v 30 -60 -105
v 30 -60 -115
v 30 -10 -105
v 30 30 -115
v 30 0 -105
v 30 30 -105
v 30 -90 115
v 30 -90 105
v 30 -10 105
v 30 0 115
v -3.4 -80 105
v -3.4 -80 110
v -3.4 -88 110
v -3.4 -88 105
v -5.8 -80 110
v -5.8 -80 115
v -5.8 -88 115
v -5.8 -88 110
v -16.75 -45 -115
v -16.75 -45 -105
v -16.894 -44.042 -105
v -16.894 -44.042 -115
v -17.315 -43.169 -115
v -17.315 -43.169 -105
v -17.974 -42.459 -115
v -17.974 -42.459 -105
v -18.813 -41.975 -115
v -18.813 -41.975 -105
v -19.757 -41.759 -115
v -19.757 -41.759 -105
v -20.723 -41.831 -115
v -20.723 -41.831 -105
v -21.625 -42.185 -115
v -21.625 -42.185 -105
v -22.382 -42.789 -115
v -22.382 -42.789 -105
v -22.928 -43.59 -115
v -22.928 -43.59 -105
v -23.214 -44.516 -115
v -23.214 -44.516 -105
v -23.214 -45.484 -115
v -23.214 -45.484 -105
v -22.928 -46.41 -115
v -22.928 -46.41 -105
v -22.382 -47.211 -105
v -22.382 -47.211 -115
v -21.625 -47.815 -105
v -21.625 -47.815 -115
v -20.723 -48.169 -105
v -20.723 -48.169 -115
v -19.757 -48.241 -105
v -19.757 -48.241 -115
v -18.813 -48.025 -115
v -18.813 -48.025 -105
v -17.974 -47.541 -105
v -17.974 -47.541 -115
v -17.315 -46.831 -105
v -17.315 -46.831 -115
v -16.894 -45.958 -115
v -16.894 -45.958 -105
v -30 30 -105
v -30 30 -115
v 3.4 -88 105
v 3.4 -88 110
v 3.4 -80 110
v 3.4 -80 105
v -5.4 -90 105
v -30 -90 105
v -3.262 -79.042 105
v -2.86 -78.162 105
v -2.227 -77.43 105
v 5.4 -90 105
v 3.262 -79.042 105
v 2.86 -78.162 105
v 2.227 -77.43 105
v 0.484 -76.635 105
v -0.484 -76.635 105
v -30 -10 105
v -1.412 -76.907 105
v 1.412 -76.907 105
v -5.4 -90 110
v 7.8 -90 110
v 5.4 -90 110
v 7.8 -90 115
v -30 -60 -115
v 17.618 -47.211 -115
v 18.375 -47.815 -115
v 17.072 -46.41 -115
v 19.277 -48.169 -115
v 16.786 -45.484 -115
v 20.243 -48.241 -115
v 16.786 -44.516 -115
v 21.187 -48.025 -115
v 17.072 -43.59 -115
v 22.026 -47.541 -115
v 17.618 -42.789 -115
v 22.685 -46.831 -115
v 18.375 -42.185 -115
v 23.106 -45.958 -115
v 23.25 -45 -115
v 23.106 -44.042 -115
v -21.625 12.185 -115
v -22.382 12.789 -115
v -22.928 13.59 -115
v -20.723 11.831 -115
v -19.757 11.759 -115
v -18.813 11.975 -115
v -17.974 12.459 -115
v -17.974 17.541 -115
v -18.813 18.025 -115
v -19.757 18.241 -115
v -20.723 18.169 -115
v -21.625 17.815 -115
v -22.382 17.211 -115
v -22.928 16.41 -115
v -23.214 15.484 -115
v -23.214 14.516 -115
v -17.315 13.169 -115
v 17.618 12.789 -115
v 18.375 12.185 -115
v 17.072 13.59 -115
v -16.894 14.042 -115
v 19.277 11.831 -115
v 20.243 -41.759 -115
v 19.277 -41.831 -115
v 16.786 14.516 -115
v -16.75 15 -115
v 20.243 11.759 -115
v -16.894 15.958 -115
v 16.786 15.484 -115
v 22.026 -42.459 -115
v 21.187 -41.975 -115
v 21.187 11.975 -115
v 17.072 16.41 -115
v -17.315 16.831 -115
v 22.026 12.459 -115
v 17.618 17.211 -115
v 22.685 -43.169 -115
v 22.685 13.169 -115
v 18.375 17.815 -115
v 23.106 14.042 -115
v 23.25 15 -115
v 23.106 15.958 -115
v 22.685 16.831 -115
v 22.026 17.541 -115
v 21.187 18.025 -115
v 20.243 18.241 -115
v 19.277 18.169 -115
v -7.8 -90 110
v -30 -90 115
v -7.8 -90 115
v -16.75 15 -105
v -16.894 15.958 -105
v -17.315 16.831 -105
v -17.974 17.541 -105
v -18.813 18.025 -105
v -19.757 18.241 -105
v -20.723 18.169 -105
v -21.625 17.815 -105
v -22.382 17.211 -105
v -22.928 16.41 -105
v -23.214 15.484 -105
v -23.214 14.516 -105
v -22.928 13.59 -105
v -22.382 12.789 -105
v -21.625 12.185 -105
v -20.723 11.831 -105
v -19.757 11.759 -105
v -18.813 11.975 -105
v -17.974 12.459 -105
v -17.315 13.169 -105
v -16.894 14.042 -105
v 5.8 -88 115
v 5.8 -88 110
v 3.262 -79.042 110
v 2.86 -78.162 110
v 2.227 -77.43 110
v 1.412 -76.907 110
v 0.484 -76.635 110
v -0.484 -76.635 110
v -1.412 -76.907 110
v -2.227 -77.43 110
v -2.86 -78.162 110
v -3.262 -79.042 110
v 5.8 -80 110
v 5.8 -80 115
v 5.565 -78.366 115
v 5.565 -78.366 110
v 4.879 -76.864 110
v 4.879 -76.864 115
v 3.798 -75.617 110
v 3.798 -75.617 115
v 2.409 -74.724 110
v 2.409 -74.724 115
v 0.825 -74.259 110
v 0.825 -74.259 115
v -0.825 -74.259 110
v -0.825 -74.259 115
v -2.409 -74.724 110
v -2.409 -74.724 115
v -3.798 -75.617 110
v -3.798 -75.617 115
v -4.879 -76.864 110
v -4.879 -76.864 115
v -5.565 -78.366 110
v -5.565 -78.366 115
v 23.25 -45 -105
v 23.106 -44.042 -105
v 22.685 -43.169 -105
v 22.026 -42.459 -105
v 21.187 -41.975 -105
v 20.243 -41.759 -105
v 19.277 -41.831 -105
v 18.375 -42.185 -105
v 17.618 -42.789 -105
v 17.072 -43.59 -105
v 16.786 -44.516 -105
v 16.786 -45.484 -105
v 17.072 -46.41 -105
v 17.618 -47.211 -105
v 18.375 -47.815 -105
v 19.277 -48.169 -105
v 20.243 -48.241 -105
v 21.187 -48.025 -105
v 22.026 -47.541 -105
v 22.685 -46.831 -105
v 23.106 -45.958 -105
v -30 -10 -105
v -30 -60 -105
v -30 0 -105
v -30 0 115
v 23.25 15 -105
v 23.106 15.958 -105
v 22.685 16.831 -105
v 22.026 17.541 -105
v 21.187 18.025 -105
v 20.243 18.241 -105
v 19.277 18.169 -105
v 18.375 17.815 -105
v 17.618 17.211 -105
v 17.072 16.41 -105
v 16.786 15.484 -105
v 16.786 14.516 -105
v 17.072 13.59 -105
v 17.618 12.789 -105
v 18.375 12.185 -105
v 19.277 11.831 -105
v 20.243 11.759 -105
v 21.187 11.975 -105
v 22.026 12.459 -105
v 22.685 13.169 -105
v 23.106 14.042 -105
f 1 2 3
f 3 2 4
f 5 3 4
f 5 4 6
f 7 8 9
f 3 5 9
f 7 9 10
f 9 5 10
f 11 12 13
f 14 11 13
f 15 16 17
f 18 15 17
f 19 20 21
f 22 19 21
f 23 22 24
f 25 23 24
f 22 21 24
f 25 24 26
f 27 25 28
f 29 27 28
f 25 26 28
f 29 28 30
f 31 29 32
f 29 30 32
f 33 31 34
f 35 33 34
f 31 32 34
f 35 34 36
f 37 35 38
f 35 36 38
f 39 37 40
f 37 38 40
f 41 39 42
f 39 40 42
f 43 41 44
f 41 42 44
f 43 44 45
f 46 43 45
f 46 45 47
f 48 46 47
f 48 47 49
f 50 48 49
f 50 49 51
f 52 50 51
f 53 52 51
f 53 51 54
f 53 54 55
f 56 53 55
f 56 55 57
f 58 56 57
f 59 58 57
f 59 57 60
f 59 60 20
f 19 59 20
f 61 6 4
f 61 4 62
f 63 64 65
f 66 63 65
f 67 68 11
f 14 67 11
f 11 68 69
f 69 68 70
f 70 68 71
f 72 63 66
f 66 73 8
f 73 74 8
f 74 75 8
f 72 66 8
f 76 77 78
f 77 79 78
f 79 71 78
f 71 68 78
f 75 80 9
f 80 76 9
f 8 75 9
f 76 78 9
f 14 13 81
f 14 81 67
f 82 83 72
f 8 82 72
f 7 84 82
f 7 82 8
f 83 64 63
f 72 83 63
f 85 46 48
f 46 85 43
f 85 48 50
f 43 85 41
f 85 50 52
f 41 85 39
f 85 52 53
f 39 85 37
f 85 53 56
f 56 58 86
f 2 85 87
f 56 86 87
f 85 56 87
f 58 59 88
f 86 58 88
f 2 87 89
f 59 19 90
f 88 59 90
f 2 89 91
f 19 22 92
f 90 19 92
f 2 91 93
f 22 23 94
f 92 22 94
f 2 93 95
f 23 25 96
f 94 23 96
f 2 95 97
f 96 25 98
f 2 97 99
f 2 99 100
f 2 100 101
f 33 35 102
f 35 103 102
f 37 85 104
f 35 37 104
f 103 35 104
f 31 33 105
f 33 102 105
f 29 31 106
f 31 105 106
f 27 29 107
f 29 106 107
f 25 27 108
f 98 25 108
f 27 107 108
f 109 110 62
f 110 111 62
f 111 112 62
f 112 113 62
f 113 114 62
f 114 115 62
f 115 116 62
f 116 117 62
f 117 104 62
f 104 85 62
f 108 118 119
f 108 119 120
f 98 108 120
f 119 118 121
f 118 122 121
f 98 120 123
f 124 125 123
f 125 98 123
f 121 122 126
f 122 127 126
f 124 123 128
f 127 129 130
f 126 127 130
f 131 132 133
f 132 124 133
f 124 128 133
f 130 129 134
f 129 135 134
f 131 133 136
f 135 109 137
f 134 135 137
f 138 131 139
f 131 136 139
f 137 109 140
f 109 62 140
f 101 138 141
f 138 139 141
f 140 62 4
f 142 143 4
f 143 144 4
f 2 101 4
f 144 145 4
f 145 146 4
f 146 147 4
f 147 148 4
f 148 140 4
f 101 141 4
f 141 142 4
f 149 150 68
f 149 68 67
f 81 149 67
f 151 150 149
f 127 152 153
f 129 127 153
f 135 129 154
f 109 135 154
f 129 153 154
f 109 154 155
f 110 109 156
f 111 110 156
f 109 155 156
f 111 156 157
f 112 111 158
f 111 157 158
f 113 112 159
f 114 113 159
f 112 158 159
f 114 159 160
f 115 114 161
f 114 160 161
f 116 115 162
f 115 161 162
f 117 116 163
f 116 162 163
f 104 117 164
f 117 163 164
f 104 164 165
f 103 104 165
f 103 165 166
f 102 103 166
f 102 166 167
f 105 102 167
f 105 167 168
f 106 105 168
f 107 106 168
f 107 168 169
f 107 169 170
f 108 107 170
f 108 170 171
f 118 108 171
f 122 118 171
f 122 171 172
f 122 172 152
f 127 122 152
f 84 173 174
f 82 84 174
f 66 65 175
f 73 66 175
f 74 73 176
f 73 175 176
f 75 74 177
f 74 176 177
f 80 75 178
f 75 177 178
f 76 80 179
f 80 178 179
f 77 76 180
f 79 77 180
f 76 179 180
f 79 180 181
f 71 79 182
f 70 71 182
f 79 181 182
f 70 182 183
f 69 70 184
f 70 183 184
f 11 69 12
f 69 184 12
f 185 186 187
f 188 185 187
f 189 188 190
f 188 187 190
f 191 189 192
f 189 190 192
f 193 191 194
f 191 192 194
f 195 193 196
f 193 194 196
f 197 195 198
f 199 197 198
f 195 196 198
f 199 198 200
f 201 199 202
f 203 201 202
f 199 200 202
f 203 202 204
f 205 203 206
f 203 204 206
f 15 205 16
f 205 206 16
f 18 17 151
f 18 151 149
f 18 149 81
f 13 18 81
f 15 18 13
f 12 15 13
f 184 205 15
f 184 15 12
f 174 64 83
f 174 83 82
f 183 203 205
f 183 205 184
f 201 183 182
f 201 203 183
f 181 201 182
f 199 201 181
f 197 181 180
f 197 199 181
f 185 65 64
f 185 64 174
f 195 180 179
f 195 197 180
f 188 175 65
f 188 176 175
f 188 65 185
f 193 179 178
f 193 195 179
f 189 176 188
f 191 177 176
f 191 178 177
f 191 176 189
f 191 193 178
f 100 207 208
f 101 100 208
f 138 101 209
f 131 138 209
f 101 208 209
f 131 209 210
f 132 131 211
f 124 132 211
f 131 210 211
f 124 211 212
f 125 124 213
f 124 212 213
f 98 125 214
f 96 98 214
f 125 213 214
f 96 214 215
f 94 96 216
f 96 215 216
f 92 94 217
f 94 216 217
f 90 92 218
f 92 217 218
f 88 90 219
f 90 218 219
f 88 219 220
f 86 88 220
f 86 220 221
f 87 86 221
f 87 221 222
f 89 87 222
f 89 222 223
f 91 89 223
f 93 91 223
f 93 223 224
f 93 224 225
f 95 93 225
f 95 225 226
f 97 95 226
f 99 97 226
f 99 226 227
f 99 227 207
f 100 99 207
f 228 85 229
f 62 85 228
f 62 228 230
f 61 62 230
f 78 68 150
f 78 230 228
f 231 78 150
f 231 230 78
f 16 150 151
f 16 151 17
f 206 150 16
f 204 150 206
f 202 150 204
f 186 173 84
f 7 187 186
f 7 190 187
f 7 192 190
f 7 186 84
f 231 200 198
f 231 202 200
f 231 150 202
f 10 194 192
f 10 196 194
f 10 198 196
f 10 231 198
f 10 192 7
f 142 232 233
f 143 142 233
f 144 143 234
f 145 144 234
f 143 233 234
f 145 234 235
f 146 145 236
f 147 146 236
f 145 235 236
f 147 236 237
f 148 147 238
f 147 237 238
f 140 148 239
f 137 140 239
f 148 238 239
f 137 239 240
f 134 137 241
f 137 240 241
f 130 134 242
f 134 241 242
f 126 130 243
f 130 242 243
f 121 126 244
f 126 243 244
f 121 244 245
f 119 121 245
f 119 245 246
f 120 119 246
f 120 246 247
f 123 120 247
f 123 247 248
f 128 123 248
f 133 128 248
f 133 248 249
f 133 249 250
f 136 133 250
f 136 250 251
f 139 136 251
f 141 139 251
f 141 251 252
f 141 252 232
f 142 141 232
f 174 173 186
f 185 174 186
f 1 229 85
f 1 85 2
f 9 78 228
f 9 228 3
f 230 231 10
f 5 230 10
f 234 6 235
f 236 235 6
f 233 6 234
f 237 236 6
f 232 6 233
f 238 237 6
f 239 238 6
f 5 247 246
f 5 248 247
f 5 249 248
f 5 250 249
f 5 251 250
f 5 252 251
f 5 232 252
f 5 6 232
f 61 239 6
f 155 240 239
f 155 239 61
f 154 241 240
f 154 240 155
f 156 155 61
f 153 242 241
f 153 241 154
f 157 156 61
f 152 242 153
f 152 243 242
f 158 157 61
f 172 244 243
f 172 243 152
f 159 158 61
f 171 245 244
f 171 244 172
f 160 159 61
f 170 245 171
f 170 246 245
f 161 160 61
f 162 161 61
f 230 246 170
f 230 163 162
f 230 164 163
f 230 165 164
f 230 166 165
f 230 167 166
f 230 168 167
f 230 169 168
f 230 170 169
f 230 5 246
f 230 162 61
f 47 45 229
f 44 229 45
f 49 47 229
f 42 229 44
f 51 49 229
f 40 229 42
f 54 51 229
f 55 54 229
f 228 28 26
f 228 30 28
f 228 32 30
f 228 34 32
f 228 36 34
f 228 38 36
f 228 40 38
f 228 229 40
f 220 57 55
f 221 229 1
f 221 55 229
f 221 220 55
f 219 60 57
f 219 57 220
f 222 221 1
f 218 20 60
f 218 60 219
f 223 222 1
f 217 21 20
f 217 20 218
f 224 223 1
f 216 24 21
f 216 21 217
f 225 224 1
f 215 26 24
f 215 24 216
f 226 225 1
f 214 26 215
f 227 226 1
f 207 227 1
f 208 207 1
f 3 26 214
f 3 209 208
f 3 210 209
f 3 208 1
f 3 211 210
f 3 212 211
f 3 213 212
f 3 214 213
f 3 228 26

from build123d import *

# Parameters (mm, degrees)
F0_W      = 60
F0_H      = 230
F1_DEPTH  = 10
F2_W      = 60
F2_H      = 10
F3_DEPTH  = 30
F4_R      = 3.25
F5_DEPTH  = 10.001
F6_W      = 60
F6_H      = 10
F7_DEPTH  = 80
F8_W      = 60
F8_H      = 10
F9_DEPTH  = 50
F10_R     = 3.25
F11_DEPTH = 10.001
F13_DEPTH = 230.001
F15_DEPTH = 5
F16_SIZE  = 2


with BuildPart() as f1:
    # F0 (on Front) → F1 (new body)
    with BuildSketch(Plane.XZ):
        Rectangle(F0_W, F0_H)
    extrude(amount=F1_DEPTH)

    # F2 (on face) → F3 (join)
    with BuildSketch(Plane(origin=(0, 0, 0), x_dir=(-1, 0, 0), z_dir=(0, 1, 0))):
        with Locations((0, -110)):
            Rectangle(F2_W, F2_H)
    extrude(amount=F3_DEPTH)

    # F4 (on face) → F5 (cut, through all)
    with BuildSketch(Plane.XY.offset(-105)):
        with Locations((20, 15)):
            Circle(F4_R)
        with Locations((-20, 15)):
            Circle(F4_R)
    extrude(amount=-F5_DEPTH, mode=Mode.SUBTRACT)

    # F6 (on face) → F7 (join)
    with BuildSketch(Plane.XZ.offset(10)):
        with Locations((0, 110)):
            Rectangle(F6_W, F6_H)
    extrude(amount=F7_DEPTH)

    # F8 (on face) → F9 (join)
    with BuildSketch(Plane.XZ.offset(10)):
        with Locations((0, -110)):
            Rectangle(F8_W, F8_H)
    extrude(amount=F9_DEPTH)

    # F10 (on face) → F11 (cut, through all)
    with BuildSketch(Plane.XY.offset(-105)):
        with Locations((20, -45)):
            Circle(F10_R)
        with Locations((-20, -45)):
            Circle(F10_R)
    extrude(amount=-F11_DEPTH, mode=Mode.SUBTRACT)

    # F12 (on face) → F13 (cut, through all)
    with BuildSketch(Plane.XY.offset(115)):
        with BuildLine():
            Line((3.4, -90), (3.4, -80))
            ThreePointArc((3.4, -80), (0, -76.6), (-3.4, -80))
            Line((-3.4, -80), (-3.4, -90))
            Line((-3.4, -90), (0, -90))
            Line((0, -90), (3.4, -90))
        make_face()
    extrude(amount=-F13_DEPTH, mode=Mode.SUBTRACT)

    # F14 (on face) → F15 (cut)
    with BuildSketch(Plane.XY.offset(115)):
        with BuildLine():
            Line((5.8, -90), (5.8, -80))
            ThreePointArc((5.8, -80), (0, -74.2), (-5.8, -80))
            Line((-5.8, -80), (-5.8, -90))
            Line((-5.8, -90), (5.8, -90))
        make_face()
    extrude(amount=-F15_DEPTH, mode=Mode.SUBTRACT)

    # F16
    f16_edges = [f1.edges().sort_by_distance(p)[0] for p in [
        (3.4, -90, 107.5),
        (-3.4, -90, 107.5),
        (5.8, -90, 112.5),
        (-5.8, -90, 112.5),
    ]]
    chamfer(f16_edges, length=F16_SIZE)


solid = f1.part
